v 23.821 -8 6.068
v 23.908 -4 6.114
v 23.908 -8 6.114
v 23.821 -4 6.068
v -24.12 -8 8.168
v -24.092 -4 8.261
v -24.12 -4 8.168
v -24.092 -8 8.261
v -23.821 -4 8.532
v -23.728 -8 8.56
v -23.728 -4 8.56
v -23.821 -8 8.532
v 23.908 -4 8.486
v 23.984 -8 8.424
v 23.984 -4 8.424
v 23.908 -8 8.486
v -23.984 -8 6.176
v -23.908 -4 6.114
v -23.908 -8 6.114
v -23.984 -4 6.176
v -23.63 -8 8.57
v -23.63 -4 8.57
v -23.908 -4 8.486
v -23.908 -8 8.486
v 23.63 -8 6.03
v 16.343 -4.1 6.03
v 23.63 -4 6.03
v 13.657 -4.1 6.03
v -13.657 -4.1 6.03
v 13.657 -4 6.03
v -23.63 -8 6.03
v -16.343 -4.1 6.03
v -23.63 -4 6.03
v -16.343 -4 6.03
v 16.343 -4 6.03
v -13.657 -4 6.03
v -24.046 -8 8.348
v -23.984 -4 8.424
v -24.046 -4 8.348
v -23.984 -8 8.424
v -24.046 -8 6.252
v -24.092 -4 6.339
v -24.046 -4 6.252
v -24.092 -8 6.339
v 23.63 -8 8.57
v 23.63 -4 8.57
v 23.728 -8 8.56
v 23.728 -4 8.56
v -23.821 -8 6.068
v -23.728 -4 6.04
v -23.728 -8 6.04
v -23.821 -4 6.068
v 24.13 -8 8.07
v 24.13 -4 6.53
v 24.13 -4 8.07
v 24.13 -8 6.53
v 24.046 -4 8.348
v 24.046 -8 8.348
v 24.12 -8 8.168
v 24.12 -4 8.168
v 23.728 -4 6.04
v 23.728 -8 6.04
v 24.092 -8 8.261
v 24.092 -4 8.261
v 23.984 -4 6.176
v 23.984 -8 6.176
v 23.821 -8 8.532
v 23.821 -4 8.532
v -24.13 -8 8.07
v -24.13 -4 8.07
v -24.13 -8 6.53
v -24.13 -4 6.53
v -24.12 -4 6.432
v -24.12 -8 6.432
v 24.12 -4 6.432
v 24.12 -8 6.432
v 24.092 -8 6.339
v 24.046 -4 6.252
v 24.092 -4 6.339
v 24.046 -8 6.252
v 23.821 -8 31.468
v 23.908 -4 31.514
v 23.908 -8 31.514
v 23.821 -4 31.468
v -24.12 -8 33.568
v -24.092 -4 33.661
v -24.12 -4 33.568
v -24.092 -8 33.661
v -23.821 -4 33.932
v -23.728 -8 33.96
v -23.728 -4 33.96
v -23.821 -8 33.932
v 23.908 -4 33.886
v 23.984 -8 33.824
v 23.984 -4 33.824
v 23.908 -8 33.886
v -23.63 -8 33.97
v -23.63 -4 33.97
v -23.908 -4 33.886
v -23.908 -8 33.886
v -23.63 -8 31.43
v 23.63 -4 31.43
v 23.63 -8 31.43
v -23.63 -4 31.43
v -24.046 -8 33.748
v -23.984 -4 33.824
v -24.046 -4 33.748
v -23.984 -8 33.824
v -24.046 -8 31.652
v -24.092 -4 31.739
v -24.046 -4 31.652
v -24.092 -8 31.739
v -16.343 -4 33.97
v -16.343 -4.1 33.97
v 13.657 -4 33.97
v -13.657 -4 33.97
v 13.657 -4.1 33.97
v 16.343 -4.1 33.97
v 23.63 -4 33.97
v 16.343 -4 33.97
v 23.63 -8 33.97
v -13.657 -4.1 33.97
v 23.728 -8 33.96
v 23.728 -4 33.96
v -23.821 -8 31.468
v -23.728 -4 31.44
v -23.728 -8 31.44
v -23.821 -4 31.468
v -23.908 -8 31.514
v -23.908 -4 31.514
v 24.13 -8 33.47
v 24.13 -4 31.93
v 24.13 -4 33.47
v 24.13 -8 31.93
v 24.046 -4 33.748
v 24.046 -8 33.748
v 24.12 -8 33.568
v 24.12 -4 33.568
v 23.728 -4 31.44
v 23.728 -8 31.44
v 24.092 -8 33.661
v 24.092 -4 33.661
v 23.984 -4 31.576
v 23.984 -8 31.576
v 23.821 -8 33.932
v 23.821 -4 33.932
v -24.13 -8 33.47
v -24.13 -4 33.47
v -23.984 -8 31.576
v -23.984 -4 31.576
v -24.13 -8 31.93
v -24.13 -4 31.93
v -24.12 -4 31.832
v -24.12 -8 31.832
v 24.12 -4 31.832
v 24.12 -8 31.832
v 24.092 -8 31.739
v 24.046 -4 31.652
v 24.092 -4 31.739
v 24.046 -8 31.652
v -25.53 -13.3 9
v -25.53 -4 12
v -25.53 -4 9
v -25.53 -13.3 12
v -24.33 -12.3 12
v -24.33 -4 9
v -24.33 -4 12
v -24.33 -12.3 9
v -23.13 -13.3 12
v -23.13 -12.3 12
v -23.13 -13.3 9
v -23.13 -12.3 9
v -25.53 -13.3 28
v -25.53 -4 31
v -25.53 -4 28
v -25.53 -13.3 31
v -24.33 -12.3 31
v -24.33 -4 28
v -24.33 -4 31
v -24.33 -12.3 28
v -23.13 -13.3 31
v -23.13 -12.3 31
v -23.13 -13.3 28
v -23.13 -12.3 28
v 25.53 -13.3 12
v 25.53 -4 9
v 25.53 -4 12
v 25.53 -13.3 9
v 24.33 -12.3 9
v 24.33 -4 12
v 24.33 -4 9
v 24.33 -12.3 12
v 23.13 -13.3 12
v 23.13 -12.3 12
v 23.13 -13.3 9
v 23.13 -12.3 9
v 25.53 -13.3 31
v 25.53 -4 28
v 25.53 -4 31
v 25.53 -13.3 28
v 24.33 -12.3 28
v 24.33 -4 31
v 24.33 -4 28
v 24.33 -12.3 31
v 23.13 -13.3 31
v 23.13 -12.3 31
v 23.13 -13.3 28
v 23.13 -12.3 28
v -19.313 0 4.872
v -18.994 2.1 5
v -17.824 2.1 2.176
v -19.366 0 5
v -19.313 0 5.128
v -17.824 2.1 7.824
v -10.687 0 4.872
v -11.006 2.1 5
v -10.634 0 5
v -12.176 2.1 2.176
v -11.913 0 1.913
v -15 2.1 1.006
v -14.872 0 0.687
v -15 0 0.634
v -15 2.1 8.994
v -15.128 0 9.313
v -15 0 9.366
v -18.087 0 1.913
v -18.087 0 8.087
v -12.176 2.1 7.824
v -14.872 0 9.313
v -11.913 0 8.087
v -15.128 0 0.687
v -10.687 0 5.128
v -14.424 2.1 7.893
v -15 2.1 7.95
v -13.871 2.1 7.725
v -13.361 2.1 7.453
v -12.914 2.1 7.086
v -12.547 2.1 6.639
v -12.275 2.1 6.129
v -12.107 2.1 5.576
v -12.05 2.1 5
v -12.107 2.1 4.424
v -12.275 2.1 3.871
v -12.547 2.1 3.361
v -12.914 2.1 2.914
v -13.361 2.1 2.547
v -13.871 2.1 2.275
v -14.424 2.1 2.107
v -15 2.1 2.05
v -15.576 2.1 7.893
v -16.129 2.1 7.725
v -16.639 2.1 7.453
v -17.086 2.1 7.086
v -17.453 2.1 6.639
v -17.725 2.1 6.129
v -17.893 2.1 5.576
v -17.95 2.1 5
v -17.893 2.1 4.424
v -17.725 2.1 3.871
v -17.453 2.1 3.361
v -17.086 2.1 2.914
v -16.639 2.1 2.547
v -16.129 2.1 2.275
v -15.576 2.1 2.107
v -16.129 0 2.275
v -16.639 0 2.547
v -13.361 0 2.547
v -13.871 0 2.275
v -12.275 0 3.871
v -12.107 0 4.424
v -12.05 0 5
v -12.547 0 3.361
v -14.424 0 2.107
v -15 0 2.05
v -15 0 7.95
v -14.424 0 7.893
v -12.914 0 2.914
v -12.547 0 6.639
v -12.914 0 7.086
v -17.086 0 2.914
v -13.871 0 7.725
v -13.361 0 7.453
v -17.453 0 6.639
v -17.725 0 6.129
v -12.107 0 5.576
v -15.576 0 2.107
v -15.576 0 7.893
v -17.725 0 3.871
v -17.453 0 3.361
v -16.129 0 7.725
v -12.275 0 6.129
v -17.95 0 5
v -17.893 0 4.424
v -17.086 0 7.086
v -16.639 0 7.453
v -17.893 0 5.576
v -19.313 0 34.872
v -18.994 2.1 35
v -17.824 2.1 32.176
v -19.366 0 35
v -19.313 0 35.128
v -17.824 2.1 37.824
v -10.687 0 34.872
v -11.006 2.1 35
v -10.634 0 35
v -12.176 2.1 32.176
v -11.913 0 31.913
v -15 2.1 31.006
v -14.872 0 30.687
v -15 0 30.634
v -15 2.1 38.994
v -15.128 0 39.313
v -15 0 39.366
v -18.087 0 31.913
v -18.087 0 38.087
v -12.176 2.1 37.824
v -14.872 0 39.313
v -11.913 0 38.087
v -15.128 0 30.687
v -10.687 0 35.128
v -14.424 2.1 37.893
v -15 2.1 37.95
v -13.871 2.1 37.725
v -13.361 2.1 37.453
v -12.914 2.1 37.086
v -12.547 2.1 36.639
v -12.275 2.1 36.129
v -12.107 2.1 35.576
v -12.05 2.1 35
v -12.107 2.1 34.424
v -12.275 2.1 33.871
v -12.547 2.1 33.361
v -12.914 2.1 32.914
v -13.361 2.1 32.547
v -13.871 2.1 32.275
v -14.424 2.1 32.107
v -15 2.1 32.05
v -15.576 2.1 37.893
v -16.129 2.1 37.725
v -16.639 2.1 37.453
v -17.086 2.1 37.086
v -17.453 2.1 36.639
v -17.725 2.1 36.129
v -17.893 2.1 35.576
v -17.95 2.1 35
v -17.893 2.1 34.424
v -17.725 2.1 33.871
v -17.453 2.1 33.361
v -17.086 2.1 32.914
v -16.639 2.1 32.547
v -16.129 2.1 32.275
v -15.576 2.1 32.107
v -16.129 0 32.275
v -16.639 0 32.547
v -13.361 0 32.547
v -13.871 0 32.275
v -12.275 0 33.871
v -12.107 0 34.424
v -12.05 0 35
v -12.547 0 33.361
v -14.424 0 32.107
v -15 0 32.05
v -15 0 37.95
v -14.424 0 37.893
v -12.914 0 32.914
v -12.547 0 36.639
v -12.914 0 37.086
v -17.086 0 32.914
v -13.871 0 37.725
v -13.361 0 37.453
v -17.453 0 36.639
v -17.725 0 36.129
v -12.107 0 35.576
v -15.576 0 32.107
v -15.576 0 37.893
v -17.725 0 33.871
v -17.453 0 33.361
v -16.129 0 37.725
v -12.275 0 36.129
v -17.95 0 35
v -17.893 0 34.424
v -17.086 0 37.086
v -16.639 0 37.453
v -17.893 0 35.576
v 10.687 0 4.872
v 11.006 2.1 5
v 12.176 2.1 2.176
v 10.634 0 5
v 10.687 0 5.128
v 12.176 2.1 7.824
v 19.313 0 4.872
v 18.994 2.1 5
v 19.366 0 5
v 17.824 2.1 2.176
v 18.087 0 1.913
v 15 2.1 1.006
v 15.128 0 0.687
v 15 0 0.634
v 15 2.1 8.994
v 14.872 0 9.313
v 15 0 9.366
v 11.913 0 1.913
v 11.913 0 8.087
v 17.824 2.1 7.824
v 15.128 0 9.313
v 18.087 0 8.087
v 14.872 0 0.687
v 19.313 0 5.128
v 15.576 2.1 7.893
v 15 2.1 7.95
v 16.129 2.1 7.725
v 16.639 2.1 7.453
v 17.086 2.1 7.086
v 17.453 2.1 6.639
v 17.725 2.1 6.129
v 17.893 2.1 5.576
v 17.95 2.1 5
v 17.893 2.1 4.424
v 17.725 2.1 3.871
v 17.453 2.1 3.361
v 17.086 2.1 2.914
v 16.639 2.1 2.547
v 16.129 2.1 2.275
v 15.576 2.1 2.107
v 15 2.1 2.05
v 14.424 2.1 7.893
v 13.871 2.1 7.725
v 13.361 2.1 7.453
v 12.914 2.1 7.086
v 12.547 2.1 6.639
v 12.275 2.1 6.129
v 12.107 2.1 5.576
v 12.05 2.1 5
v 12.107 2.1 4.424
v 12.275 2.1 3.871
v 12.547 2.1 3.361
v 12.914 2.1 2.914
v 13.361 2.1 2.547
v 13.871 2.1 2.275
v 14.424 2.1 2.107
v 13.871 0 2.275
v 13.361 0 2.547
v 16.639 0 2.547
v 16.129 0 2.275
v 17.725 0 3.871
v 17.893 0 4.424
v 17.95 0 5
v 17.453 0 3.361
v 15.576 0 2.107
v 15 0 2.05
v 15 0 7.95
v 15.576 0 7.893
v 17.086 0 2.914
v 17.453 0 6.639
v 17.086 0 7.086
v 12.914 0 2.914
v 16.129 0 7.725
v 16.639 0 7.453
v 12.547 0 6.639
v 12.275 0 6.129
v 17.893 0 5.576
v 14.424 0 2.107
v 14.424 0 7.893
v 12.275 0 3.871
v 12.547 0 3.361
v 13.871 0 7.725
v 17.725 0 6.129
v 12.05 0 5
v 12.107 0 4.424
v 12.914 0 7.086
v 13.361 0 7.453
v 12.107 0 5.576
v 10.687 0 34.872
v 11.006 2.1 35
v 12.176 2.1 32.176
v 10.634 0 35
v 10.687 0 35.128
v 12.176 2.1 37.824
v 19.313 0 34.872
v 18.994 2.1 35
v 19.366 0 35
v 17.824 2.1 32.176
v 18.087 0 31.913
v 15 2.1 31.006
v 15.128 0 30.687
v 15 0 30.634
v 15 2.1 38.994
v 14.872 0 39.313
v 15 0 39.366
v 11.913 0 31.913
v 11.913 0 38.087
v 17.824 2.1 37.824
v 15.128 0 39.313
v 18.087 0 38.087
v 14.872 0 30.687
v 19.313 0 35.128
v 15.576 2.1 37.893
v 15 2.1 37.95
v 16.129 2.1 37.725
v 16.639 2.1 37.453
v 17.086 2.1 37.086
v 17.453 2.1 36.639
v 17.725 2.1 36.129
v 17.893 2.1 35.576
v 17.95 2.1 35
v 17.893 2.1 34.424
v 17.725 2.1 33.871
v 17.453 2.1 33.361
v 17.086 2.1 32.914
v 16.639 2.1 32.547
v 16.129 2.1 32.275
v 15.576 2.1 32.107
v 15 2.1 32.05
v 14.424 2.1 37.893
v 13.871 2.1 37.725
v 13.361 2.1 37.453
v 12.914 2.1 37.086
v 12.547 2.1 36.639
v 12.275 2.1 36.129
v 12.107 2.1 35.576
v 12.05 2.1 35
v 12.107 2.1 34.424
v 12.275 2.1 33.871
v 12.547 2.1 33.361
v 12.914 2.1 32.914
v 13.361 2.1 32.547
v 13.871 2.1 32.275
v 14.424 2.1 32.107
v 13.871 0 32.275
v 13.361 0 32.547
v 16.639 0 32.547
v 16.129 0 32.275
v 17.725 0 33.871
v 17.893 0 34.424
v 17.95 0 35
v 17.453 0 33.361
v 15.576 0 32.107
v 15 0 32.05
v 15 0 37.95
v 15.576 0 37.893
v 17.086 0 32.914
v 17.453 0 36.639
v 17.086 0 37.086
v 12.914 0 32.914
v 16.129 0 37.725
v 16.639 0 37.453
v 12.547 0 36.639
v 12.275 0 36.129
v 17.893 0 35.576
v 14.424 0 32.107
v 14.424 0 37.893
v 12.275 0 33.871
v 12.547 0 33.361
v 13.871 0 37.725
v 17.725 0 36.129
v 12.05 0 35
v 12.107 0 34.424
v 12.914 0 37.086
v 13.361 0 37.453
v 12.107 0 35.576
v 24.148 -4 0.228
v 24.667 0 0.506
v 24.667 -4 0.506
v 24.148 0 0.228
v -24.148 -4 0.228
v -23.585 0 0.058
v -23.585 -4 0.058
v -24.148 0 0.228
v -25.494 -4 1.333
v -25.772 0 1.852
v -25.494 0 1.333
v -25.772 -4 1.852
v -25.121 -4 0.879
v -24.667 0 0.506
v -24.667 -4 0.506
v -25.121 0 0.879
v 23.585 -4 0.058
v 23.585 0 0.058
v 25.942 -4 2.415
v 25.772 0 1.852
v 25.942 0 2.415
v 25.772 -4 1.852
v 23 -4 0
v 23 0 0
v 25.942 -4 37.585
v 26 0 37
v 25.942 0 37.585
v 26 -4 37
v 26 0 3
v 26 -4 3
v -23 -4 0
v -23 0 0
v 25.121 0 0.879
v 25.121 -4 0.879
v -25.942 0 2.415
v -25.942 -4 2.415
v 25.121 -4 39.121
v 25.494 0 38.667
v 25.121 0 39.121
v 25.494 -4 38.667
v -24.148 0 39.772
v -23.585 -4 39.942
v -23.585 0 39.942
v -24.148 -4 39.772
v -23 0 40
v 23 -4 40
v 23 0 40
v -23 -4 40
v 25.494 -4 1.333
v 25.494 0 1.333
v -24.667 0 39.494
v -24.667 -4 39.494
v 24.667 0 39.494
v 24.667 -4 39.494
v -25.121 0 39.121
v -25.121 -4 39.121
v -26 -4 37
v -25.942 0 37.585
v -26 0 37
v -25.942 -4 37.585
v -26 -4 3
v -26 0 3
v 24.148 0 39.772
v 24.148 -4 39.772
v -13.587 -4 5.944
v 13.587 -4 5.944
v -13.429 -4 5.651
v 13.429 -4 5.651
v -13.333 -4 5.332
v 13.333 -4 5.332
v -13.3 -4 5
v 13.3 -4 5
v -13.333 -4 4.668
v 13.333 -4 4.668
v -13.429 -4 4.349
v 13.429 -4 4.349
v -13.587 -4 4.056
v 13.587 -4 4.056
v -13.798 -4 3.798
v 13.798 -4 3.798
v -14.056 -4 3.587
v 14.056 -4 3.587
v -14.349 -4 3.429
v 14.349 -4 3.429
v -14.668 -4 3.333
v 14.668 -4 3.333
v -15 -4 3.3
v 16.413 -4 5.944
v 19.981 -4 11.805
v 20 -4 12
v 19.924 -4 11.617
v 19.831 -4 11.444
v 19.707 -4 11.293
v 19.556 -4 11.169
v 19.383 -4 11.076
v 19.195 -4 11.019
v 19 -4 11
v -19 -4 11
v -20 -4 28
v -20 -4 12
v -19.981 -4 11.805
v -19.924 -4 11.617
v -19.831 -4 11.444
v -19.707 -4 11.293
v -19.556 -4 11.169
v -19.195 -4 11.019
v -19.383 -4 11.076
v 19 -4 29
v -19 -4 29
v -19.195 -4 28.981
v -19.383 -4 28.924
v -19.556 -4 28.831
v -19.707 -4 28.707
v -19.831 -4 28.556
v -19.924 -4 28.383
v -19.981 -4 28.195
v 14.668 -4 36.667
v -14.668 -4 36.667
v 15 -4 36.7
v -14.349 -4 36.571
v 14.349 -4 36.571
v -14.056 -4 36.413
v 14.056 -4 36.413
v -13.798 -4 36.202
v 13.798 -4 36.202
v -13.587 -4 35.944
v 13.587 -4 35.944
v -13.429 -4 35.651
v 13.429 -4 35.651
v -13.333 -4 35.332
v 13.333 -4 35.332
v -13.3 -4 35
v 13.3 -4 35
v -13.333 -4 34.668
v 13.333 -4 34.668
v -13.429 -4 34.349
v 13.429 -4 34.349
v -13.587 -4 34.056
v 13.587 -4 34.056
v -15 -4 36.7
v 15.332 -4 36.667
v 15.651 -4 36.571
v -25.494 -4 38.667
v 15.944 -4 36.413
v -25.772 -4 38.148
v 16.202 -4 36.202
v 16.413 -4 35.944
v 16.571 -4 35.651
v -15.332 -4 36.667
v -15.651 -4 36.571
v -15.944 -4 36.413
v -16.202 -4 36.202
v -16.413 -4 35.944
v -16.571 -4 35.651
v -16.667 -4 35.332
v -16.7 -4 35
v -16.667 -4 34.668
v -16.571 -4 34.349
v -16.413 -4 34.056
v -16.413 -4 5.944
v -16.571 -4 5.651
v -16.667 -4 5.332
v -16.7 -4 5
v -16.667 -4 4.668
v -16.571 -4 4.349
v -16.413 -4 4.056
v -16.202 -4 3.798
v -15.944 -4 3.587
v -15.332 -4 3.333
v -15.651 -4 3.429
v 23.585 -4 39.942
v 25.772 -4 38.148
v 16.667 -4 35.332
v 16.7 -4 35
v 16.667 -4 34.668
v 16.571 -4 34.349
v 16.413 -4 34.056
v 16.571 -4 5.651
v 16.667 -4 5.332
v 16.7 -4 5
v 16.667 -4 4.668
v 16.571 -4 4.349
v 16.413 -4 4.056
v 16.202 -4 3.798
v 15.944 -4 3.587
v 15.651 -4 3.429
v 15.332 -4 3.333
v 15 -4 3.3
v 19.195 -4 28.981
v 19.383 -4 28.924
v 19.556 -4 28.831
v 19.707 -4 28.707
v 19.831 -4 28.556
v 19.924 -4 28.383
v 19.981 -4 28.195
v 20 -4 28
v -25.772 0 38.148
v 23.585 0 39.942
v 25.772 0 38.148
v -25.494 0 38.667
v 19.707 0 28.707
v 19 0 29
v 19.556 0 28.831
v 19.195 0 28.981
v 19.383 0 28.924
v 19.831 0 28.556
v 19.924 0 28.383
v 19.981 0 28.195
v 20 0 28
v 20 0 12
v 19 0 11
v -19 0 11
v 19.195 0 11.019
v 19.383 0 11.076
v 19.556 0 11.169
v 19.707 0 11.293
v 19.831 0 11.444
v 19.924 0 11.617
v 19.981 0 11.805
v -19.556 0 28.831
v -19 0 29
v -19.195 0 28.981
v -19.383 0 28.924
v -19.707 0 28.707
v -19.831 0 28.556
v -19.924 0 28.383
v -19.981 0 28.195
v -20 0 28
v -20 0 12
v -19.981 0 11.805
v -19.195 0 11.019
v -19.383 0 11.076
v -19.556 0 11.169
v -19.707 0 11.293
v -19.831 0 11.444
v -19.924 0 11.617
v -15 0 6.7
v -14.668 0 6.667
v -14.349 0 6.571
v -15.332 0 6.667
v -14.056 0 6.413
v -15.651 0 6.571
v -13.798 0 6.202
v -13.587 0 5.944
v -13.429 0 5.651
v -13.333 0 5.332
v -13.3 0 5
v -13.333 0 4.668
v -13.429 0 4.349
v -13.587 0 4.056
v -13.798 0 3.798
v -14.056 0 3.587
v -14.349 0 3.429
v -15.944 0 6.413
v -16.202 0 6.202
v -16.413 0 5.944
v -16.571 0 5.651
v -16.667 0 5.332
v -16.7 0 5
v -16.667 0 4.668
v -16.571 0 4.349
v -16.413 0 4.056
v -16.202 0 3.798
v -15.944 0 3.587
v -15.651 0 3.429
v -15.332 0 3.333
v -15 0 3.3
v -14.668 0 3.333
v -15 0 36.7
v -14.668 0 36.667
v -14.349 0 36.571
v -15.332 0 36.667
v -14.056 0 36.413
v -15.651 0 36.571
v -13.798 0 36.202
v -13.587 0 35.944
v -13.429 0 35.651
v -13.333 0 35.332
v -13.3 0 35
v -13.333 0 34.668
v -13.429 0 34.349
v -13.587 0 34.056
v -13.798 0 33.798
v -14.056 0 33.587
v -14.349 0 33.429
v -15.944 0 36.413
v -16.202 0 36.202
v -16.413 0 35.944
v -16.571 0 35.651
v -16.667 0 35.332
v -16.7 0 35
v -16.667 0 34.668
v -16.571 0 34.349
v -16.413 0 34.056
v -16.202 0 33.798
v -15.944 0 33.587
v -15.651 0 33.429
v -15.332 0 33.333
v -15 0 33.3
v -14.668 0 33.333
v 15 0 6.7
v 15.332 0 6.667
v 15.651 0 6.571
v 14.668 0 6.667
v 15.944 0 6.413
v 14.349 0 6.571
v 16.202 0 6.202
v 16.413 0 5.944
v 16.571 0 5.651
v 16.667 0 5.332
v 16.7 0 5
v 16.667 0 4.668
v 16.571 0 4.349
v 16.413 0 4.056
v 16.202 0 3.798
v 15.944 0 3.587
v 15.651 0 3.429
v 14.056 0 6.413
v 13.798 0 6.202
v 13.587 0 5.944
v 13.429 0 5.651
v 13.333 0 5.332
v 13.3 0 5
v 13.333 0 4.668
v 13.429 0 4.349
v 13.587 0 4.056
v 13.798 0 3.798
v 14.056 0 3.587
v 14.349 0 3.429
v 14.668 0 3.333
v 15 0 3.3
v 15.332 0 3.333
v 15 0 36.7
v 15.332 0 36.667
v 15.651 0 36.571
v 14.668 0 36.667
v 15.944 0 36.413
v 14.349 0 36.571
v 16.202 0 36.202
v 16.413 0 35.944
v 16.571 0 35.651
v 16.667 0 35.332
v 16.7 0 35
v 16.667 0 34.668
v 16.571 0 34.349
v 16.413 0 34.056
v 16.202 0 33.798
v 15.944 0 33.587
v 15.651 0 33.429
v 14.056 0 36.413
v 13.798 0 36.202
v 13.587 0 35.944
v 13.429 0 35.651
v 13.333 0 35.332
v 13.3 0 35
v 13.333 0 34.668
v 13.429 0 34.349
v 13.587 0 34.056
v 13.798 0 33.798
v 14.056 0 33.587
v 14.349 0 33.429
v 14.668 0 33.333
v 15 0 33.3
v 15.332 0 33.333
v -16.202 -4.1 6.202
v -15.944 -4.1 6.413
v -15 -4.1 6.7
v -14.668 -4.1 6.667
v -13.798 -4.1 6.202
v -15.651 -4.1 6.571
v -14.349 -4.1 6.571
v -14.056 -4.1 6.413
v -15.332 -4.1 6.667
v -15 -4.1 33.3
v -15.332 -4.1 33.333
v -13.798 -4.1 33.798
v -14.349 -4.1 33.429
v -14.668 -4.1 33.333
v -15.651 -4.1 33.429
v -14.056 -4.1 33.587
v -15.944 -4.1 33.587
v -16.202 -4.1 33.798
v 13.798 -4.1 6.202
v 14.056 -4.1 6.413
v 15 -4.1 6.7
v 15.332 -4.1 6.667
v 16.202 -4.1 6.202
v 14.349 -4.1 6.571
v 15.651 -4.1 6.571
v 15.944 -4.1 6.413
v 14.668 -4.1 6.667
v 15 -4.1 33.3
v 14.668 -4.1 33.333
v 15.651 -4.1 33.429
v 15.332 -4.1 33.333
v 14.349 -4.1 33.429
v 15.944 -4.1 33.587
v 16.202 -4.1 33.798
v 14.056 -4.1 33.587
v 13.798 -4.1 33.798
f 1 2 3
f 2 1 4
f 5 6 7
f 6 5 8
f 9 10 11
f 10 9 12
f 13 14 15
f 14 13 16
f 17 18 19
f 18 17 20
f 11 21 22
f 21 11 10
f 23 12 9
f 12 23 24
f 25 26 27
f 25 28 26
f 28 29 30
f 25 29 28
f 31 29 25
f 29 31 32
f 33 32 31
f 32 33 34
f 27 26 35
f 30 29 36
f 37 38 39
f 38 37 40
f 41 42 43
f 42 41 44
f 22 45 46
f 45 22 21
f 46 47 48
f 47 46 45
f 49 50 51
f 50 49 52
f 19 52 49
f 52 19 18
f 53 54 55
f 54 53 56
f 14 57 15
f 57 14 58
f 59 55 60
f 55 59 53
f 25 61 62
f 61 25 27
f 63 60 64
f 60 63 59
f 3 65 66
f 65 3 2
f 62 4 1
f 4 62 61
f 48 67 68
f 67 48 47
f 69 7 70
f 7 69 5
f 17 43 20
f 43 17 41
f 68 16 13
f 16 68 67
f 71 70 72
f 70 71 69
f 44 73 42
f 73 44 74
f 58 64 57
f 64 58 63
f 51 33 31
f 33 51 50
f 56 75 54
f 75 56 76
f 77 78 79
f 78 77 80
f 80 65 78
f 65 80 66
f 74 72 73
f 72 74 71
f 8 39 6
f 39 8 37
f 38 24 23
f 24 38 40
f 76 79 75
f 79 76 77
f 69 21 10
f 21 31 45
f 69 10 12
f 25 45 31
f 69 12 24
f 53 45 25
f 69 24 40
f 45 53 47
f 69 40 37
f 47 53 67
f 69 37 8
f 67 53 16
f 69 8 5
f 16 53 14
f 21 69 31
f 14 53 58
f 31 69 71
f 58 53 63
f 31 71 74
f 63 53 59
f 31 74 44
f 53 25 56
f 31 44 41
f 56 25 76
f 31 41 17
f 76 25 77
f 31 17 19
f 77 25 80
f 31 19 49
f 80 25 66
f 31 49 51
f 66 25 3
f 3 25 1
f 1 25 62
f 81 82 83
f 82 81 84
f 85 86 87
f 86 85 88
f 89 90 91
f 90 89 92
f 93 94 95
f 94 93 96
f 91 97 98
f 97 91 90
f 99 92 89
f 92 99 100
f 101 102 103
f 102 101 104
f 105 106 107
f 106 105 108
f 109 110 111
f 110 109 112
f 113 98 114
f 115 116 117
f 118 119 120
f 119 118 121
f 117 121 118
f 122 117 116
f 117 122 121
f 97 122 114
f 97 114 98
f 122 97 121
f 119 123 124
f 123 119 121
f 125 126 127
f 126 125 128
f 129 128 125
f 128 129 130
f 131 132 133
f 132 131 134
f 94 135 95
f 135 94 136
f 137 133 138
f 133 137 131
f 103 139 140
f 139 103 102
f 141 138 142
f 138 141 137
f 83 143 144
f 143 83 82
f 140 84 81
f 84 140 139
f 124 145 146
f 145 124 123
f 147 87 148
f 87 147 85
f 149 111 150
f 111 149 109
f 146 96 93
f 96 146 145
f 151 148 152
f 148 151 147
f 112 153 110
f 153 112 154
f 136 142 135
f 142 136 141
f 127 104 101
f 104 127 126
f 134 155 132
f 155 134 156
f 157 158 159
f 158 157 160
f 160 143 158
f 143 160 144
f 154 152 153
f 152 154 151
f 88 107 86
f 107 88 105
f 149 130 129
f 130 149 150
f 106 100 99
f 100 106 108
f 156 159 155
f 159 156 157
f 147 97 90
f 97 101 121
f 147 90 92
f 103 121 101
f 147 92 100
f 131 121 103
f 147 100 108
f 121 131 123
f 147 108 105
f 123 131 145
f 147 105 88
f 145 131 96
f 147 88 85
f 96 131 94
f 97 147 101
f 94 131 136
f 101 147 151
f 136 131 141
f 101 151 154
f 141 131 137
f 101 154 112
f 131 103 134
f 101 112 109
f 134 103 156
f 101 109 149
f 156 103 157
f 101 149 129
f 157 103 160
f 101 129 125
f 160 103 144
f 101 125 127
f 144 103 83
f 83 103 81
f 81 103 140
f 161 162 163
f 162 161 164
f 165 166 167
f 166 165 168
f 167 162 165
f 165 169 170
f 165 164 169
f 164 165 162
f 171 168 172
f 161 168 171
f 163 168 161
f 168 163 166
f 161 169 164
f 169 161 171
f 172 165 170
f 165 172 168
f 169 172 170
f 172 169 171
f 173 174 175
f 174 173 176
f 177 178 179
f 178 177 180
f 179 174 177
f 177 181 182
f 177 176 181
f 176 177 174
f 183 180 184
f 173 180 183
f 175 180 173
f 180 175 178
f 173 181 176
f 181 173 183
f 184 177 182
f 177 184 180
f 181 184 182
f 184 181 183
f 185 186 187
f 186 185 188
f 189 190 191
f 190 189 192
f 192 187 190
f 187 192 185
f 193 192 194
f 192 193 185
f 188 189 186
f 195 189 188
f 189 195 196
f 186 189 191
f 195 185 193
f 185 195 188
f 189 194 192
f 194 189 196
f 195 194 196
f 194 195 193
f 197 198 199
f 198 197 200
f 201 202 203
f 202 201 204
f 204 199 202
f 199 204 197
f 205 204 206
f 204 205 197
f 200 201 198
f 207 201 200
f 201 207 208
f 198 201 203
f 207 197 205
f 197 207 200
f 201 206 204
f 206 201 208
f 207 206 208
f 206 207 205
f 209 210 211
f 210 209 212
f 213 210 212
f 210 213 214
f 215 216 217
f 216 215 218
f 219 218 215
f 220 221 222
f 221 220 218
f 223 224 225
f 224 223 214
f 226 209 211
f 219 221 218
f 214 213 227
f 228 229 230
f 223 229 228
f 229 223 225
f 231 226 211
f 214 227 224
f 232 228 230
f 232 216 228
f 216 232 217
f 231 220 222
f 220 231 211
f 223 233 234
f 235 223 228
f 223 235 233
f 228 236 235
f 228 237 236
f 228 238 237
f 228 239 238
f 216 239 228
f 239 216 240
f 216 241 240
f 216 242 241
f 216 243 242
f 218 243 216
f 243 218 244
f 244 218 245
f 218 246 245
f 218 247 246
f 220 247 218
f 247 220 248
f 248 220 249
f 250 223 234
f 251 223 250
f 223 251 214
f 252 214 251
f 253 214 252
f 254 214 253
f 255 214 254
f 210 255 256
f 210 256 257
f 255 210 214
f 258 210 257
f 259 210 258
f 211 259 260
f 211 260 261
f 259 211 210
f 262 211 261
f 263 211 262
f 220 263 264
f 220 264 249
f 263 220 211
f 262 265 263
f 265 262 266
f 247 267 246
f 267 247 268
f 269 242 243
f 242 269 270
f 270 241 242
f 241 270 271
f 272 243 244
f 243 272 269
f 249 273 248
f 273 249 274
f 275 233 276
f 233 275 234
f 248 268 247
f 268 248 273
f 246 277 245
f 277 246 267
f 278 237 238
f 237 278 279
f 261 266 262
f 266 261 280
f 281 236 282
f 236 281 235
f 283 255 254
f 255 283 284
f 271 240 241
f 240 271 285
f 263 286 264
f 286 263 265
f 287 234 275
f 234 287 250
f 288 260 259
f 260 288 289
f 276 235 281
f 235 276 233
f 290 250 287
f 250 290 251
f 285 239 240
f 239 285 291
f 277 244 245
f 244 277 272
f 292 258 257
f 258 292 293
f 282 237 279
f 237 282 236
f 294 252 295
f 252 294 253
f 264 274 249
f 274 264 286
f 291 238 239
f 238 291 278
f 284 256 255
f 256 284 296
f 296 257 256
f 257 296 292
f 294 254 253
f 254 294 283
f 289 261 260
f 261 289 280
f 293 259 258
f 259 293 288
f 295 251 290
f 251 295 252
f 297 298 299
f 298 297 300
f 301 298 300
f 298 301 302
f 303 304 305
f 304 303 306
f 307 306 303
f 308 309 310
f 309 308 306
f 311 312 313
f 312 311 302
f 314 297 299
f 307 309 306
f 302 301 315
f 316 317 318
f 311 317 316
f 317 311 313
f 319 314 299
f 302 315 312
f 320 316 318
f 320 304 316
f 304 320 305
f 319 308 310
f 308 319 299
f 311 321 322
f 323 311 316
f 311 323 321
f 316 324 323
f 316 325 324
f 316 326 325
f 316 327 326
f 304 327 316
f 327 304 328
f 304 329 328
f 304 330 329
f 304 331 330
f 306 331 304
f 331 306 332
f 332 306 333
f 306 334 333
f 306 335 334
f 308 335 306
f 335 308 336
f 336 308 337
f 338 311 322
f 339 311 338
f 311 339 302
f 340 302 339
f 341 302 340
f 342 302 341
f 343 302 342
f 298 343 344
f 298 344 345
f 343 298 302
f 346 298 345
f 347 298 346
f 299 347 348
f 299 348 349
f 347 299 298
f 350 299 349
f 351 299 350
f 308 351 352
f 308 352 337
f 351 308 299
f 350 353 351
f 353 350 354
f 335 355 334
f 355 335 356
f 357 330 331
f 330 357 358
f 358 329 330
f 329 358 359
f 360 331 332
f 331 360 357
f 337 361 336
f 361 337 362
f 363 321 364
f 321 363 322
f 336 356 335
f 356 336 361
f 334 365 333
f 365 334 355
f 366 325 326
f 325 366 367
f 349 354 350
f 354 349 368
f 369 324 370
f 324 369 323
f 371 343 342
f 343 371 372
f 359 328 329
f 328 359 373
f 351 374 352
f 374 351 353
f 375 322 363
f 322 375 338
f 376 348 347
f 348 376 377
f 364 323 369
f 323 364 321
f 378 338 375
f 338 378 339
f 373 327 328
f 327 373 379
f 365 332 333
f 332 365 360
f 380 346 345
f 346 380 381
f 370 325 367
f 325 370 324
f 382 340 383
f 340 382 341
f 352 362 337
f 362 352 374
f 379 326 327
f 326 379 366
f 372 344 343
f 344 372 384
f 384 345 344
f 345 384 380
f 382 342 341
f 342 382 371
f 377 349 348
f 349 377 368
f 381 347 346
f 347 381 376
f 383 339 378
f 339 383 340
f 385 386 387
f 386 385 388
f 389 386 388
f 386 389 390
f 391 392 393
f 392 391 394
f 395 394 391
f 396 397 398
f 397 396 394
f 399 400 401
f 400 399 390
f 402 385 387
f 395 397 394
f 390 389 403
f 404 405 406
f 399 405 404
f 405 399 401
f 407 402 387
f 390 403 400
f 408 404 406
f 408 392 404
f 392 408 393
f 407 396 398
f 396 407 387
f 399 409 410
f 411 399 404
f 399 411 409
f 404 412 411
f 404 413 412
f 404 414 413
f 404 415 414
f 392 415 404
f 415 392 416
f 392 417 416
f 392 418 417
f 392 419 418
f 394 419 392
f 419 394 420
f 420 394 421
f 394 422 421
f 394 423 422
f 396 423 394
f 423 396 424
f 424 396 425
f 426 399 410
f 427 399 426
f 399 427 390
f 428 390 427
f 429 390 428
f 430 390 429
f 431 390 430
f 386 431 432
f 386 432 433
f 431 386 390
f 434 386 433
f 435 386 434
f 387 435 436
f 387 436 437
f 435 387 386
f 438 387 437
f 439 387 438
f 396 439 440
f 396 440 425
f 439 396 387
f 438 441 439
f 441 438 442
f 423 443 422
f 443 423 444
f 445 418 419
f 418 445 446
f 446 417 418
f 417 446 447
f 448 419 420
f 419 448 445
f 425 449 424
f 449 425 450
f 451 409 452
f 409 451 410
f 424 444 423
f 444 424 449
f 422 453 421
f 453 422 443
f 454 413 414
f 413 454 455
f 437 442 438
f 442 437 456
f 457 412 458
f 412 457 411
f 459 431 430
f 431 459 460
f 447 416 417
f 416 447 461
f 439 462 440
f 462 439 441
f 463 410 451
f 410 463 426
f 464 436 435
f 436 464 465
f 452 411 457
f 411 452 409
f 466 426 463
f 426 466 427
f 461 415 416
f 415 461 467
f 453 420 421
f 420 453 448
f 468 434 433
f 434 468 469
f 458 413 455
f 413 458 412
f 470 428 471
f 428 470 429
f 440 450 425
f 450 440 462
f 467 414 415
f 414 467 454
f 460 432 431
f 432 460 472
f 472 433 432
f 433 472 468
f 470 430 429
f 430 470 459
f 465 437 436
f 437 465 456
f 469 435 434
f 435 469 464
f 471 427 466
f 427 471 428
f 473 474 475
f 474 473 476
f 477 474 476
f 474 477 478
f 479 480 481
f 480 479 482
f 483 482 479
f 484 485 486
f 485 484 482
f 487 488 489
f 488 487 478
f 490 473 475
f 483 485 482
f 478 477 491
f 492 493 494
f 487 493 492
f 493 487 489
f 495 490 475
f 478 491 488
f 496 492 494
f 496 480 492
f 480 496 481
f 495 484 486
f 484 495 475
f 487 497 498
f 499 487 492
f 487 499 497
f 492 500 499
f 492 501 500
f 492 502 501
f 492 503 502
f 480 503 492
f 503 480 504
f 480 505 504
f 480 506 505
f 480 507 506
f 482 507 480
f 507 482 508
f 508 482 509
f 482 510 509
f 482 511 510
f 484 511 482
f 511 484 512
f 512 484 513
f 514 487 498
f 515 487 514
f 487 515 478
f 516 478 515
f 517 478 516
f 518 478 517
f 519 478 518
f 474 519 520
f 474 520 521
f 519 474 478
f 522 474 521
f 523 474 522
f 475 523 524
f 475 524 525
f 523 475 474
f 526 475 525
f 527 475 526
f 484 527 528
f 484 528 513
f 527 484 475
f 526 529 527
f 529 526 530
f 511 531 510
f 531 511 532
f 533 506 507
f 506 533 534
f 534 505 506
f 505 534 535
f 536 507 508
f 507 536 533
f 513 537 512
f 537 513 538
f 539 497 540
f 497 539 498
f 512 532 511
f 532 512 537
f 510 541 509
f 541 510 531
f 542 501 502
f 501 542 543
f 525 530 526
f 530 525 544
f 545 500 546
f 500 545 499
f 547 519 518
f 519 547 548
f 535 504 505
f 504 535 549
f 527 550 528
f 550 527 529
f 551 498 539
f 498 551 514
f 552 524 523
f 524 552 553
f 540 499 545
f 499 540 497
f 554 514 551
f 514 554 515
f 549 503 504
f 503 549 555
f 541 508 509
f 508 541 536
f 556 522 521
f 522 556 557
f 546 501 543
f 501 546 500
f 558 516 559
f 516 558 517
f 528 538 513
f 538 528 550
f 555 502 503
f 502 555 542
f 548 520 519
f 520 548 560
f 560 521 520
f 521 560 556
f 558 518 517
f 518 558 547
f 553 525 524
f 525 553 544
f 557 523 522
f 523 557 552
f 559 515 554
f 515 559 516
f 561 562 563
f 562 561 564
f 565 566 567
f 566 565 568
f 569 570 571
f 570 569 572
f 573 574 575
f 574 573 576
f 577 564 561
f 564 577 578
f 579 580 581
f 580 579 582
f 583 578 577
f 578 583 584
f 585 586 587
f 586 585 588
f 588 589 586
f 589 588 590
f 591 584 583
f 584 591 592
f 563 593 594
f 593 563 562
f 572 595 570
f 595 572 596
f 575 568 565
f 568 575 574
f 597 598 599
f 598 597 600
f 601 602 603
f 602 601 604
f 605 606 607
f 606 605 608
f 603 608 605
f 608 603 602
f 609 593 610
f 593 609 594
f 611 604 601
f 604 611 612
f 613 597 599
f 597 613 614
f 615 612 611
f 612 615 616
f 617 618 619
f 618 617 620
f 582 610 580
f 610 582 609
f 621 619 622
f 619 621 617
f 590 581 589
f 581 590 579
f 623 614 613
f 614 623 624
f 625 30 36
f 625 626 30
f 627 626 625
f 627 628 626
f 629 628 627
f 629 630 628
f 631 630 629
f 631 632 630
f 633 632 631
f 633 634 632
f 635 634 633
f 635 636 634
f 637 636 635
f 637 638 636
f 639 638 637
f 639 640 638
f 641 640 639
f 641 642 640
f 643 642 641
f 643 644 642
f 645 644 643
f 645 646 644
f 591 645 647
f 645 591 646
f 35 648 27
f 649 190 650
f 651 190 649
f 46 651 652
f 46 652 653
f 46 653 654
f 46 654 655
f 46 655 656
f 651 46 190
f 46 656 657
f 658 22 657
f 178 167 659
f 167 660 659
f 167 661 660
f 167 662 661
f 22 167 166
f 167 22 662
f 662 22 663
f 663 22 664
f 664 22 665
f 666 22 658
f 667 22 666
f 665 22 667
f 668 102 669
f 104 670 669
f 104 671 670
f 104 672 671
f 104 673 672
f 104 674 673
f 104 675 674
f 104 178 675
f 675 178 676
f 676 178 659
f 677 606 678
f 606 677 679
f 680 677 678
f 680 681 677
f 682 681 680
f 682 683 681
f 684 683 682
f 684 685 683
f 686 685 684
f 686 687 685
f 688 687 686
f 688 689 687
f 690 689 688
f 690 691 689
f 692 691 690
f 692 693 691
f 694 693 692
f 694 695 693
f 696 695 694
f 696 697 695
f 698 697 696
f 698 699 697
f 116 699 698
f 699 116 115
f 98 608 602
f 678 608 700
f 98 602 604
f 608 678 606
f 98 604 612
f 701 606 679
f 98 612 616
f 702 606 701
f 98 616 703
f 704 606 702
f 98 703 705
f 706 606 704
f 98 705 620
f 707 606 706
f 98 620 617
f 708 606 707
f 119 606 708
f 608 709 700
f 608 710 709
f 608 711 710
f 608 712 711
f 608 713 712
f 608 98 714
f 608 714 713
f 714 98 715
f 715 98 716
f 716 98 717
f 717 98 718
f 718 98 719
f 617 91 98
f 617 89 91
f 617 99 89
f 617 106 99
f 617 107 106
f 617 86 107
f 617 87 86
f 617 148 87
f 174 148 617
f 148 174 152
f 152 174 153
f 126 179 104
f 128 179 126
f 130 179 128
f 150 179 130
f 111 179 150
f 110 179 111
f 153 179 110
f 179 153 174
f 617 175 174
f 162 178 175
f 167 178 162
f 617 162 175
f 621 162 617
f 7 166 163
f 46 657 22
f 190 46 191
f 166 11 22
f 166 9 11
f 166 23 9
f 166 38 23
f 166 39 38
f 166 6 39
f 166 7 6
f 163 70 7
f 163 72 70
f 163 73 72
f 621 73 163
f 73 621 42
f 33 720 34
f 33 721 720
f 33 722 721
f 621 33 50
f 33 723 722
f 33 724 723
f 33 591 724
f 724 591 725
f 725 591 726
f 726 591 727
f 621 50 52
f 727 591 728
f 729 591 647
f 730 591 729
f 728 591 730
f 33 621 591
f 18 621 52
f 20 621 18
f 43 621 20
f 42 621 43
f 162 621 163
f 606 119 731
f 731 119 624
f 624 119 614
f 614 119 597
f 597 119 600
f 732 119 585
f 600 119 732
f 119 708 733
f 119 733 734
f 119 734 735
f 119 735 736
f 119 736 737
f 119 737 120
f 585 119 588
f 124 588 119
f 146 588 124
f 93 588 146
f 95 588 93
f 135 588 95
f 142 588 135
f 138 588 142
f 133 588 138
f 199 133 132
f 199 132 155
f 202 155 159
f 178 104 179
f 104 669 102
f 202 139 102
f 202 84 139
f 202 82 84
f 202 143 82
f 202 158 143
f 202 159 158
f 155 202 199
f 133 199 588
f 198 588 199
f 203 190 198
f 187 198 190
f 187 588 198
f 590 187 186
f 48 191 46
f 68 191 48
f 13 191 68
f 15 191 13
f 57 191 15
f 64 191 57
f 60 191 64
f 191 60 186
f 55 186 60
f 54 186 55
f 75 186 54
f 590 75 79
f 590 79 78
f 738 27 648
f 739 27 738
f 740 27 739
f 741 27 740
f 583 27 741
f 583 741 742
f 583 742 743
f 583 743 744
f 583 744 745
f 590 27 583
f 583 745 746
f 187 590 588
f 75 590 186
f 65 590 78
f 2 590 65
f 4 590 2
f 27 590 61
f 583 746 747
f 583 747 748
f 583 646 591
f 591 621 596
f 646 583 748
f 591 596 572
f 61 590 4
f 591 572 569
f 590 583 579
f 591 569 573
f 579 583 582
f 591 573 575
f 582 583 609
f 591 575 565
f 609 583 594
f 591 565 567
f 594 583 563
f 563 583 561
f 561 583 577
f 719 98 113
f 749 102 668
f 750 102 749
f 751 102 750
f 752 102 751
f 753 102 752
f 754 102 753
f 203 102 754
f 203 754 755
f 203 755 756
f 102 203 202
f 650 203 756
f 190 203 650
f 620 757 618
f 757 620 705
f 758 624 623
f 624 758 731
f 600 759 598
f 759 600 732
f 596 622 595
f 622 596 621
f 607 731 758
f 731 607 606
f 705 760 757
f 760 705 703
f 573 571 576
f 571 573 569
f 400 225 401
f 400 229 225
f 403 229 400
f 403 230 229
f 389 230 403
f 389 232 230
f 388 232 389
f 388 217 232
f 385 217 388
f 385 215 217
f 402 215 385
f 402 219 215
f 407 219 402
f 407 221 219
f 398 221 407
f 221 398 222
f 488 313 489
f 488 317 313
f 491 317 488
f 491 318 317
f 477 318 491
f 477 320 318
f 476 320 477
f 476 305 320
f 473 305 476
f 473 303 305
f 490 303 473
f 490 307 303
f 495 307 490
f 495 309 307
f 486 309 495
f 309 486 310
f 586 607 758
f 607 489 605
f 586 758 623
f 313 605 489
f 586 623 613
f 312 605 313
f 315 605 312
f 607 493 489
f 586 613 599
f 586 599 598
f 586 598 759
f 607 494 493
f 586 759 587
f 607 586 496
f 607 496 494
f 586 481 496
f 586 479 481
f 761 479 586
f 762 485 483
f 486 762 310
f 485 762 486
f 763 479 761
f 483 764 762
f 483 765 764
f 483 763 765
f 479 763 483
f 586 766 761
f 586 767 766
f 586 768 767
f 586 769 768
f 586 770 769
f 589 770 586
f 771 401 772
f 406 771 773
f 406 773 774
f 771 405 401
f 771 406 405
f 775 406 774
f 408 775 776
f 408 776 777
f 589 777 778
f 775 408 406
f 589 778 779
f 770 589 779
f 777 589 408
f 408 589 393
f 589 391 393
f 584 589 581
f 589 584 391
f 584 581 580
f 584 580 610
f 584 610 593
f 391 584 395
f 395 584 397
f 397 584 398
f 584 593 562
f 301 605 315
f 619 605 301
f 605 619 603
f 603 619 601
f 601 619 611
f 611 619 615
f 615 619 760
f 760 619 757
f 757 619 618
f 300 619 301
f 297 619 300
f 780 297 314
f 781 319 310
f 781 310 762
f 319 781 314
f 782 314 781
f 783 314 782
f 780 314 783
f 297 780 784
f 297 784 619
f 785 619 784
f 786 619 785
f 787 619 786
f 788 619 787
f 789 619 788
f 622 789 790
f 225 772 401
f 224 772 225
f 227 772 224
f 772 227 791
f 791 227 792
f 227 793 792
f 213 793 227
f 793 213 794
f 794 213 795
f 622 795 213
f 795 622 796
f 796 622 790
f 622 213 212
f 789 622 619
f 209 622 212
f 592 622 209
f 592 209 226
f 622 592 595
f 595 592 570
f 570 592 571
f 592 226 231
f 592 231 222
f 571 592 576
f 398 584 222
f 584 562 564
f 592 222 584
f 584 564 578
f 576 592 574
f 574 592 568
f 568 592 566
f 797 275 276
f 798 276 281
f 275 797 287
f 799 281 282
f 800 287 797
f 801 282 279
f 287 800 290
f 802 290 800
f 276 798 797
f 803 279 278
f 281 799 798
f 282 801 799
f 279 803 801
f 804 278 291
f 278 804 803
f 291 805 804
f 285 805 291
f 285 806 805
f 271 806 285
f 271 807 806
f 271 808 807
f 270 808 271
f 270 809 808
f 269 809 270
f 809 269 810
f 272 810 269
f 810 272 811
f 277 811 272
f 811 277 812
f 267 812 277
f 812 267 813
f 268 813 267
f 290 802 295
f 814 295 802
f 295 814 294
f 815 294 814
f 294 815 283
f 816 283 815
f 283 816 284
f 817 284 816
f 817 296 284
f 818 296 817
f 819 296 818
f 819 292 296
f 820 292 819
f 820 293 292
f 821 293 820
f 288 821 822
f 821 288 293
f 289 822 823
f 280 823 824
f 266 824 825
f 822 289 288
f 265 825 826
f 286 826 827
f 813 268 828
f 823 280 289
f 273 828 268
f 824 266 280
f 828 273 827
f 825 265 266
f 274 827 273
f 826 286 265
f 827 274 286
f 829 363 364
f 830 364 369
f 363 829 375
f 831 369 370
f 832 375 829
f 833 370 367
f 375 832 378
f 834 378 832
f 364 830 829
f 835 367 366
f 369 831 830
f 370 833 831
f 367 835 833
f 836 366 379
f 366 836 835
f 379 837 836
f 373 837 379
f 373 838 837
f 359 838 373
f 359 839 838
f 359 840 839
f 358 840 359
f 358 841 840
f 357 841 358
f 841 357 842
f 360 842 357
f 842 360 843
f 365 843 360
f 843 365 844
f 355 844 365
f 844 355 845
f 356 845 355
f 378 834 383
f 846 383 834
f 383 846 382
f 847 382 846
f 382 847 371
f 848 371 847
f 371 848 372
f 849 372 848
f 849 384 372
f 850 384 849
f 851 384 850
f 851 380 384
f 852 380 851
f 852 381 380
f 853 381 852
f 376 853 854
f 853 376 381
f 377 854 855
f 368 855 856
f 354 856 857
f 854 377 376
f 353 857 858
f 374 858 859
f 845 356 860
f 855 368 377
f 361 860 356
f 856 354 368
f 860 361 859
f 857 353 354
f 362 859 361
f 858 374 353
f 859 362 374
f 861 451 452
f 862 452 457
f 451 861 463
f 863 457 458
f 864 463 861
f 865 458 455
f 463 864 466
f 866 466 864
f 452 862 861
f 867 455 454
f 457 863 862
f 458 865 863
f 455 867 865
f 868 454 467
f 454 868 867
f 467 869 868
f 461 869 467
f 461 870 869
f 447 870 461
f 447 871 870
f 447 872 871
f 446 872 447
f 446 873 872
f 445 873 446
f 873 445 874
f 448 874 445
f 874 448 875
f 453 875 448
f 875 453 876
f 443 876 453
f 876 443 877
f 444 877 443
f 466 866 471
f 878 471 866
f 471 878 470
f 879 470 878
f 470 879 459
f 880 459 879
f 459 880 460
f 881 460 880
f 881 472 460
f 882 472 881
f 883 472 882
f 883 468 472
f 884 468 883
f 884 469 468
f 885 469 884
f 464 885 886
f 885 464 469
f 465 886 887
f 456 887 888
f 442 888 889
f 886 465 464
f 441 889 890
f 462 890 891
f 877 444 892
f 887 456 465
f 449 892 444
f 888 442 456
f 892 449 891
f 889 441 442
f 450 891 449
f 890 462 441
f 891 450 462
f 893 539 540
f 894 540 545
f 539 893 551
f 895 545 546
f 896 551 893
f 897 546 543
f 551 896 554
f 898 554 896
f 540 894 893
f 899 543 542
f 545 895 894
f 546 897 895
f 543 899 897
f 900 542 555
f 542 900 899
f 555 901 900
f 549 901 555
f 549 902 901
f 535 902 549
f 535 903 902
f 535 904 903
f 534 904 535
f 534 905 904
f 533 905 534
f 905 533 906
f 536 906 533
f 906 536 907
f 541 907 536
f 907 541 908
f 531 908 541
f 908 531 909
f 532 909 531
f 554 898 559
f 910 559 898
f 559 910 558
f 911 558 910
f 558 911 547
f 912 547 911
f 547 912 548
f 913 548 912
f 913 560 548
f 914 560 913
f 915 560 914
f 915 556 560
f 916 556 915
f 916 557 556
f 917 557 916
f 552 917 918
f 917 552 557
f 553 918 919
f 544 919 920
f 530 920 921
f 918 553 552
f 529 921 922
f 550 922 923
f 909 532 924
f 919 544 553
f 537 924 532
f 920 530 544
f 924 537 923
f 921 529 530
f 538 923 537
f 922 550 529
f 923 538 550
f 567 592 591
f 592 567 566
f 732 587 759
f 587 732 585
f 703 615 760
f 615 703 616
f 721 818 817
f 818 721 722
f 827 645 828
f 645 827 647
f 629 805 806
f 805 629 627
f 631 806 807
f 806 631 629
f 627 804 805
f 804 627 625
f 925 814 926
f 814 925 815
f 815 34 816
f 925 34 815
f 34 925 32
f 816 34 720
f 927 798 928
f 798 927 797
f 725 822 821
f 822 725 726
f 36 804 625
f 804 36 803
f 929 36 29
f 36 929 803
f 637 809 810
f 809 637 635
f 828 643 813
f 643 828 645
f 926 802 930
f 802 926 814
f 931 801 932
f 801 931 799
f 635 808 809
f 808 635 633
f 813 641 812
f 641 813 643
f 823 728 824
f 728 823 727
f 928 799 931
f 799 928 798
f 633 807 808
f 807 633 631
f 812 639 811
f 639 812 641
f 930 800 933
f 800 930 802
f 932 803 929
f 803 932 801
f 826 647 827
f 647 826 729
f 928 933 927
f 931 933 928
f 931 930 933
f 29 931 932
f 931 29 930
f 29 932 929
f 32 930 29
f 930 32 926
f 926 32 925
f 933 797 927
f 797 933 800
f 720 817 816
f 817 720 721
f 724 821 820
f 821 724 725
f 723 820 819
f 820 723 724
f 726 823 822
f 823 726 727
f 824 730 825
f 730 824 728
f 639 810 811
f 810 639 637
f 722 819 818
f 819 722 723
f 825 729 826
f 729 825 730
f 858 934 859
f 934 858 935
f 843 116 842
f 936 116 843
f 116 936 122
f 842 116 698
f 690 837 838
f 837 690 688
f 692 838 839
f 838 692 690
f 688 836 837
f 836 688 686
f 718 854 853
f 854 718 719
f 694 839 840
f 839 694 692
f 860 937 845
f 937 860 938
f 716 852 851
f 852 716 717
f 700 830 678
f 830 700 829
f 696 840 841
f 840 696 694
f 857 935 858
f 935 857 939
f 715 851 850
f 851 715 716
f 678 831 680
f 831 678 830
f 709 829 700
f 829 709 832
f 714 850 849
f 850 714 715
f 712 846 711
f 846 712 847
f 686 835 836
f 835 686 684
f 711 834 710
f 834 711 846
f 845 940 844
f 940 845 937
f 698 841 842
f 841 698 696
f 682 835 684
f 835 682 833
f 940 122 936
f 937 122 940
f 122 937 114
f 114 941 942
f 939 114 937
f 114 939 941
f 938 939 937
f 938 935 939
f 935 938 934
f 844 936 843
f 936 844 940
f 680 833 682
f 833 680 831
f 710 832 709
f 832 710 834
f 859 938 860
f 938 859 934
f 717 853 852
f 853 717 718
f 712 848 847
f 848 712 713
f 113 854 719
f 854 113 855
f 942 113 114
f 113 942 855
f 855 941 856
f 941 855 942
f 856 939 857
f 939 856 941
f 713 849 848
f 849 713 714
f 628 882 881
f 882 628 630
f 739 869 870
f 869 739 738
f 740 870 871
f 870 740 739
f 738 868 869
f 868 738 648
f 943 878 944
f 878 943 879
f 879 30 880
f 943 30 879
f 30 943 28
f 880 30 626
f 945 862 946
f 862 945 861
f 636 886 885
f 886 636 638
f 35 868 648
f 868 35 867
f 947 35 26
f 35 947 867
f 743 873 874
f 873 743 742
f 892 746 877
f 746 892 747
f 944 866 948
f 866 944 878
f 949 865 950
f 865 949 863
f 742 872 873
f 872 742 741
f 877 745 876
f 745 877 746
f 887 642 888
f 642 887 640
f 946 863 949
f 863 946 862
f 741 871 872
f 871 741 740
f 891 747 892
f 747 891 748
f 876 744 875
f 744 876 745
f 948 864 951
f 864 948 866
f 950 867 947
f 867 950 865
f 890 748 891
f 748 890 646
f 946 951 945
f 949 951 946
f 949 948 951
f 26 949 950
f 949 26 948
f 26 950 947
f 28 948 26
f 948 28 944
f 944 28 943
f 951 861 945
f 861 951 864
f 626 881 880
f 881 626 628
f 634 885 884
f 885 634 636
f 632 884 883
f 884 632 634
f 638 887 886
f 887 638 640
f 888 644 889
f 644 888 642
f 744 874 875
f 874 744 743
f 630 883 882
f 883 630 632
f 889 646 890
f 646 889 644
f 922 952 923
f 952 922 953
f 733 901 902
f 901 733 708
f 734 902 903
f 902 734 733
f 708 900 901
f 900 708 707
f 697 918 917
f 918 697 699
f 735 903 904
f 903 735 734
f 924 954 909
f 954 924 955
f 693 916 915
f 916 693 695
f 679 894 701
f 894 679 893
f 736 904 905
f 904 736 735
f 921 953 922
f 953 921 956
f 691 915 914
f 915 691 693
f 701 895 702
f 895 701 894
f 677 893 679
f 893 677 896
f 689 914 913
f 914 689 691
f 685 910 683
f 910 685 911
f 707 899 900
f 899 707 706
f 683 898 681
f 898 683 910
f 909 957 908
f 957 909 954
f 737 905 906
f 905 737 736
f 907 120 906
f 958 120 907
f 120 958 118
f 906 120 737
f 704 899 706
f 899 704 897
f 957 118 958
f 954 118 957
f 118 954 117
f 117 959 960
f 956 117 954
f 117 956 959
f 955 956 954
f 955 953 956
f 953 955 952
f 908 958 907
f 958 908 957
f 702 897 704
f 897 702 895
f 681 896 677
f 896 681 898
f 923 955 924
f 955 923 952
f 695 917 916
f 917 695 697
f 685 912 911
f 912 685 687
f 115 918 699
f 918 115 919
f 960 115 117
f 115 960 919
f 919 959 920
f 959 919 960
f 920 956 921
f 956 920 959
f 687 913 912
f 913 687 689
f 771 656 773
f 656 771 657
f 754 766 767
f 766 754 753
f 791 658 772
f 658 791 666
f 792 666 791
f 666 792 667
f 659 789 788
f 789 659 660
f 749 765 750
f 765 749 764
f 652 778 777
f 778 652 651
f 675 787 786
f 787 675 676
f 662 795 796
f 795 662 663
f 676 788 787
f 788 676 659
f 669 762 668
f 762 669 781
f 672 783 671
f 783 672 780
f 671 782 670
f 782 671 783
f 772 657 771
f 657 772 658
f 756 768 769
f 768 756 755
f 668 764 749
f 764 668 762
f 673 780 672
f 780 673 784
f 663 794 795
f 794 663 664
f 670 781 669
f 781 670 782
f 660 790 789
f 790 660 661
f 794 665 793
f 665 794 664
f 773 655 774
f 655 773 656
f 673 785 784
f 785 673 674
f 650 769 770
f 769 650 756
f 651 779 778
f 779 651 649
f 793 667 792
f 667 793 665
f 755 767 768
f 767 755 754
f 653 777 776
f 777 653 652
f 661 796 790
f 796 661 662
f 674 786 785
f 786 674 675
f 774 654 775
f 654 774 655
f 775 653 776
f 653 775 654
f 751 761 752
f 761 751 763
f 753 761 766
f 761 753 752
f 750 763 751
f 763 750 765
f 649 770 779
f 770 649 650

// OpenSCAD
include <../lib/robotskin.scad>
translate([0,0,RM_ESP32_DEVKITC_BODY_SIZE[1]/2])
  rotate([90,0,0]) esp32_devkitc_carrier();
